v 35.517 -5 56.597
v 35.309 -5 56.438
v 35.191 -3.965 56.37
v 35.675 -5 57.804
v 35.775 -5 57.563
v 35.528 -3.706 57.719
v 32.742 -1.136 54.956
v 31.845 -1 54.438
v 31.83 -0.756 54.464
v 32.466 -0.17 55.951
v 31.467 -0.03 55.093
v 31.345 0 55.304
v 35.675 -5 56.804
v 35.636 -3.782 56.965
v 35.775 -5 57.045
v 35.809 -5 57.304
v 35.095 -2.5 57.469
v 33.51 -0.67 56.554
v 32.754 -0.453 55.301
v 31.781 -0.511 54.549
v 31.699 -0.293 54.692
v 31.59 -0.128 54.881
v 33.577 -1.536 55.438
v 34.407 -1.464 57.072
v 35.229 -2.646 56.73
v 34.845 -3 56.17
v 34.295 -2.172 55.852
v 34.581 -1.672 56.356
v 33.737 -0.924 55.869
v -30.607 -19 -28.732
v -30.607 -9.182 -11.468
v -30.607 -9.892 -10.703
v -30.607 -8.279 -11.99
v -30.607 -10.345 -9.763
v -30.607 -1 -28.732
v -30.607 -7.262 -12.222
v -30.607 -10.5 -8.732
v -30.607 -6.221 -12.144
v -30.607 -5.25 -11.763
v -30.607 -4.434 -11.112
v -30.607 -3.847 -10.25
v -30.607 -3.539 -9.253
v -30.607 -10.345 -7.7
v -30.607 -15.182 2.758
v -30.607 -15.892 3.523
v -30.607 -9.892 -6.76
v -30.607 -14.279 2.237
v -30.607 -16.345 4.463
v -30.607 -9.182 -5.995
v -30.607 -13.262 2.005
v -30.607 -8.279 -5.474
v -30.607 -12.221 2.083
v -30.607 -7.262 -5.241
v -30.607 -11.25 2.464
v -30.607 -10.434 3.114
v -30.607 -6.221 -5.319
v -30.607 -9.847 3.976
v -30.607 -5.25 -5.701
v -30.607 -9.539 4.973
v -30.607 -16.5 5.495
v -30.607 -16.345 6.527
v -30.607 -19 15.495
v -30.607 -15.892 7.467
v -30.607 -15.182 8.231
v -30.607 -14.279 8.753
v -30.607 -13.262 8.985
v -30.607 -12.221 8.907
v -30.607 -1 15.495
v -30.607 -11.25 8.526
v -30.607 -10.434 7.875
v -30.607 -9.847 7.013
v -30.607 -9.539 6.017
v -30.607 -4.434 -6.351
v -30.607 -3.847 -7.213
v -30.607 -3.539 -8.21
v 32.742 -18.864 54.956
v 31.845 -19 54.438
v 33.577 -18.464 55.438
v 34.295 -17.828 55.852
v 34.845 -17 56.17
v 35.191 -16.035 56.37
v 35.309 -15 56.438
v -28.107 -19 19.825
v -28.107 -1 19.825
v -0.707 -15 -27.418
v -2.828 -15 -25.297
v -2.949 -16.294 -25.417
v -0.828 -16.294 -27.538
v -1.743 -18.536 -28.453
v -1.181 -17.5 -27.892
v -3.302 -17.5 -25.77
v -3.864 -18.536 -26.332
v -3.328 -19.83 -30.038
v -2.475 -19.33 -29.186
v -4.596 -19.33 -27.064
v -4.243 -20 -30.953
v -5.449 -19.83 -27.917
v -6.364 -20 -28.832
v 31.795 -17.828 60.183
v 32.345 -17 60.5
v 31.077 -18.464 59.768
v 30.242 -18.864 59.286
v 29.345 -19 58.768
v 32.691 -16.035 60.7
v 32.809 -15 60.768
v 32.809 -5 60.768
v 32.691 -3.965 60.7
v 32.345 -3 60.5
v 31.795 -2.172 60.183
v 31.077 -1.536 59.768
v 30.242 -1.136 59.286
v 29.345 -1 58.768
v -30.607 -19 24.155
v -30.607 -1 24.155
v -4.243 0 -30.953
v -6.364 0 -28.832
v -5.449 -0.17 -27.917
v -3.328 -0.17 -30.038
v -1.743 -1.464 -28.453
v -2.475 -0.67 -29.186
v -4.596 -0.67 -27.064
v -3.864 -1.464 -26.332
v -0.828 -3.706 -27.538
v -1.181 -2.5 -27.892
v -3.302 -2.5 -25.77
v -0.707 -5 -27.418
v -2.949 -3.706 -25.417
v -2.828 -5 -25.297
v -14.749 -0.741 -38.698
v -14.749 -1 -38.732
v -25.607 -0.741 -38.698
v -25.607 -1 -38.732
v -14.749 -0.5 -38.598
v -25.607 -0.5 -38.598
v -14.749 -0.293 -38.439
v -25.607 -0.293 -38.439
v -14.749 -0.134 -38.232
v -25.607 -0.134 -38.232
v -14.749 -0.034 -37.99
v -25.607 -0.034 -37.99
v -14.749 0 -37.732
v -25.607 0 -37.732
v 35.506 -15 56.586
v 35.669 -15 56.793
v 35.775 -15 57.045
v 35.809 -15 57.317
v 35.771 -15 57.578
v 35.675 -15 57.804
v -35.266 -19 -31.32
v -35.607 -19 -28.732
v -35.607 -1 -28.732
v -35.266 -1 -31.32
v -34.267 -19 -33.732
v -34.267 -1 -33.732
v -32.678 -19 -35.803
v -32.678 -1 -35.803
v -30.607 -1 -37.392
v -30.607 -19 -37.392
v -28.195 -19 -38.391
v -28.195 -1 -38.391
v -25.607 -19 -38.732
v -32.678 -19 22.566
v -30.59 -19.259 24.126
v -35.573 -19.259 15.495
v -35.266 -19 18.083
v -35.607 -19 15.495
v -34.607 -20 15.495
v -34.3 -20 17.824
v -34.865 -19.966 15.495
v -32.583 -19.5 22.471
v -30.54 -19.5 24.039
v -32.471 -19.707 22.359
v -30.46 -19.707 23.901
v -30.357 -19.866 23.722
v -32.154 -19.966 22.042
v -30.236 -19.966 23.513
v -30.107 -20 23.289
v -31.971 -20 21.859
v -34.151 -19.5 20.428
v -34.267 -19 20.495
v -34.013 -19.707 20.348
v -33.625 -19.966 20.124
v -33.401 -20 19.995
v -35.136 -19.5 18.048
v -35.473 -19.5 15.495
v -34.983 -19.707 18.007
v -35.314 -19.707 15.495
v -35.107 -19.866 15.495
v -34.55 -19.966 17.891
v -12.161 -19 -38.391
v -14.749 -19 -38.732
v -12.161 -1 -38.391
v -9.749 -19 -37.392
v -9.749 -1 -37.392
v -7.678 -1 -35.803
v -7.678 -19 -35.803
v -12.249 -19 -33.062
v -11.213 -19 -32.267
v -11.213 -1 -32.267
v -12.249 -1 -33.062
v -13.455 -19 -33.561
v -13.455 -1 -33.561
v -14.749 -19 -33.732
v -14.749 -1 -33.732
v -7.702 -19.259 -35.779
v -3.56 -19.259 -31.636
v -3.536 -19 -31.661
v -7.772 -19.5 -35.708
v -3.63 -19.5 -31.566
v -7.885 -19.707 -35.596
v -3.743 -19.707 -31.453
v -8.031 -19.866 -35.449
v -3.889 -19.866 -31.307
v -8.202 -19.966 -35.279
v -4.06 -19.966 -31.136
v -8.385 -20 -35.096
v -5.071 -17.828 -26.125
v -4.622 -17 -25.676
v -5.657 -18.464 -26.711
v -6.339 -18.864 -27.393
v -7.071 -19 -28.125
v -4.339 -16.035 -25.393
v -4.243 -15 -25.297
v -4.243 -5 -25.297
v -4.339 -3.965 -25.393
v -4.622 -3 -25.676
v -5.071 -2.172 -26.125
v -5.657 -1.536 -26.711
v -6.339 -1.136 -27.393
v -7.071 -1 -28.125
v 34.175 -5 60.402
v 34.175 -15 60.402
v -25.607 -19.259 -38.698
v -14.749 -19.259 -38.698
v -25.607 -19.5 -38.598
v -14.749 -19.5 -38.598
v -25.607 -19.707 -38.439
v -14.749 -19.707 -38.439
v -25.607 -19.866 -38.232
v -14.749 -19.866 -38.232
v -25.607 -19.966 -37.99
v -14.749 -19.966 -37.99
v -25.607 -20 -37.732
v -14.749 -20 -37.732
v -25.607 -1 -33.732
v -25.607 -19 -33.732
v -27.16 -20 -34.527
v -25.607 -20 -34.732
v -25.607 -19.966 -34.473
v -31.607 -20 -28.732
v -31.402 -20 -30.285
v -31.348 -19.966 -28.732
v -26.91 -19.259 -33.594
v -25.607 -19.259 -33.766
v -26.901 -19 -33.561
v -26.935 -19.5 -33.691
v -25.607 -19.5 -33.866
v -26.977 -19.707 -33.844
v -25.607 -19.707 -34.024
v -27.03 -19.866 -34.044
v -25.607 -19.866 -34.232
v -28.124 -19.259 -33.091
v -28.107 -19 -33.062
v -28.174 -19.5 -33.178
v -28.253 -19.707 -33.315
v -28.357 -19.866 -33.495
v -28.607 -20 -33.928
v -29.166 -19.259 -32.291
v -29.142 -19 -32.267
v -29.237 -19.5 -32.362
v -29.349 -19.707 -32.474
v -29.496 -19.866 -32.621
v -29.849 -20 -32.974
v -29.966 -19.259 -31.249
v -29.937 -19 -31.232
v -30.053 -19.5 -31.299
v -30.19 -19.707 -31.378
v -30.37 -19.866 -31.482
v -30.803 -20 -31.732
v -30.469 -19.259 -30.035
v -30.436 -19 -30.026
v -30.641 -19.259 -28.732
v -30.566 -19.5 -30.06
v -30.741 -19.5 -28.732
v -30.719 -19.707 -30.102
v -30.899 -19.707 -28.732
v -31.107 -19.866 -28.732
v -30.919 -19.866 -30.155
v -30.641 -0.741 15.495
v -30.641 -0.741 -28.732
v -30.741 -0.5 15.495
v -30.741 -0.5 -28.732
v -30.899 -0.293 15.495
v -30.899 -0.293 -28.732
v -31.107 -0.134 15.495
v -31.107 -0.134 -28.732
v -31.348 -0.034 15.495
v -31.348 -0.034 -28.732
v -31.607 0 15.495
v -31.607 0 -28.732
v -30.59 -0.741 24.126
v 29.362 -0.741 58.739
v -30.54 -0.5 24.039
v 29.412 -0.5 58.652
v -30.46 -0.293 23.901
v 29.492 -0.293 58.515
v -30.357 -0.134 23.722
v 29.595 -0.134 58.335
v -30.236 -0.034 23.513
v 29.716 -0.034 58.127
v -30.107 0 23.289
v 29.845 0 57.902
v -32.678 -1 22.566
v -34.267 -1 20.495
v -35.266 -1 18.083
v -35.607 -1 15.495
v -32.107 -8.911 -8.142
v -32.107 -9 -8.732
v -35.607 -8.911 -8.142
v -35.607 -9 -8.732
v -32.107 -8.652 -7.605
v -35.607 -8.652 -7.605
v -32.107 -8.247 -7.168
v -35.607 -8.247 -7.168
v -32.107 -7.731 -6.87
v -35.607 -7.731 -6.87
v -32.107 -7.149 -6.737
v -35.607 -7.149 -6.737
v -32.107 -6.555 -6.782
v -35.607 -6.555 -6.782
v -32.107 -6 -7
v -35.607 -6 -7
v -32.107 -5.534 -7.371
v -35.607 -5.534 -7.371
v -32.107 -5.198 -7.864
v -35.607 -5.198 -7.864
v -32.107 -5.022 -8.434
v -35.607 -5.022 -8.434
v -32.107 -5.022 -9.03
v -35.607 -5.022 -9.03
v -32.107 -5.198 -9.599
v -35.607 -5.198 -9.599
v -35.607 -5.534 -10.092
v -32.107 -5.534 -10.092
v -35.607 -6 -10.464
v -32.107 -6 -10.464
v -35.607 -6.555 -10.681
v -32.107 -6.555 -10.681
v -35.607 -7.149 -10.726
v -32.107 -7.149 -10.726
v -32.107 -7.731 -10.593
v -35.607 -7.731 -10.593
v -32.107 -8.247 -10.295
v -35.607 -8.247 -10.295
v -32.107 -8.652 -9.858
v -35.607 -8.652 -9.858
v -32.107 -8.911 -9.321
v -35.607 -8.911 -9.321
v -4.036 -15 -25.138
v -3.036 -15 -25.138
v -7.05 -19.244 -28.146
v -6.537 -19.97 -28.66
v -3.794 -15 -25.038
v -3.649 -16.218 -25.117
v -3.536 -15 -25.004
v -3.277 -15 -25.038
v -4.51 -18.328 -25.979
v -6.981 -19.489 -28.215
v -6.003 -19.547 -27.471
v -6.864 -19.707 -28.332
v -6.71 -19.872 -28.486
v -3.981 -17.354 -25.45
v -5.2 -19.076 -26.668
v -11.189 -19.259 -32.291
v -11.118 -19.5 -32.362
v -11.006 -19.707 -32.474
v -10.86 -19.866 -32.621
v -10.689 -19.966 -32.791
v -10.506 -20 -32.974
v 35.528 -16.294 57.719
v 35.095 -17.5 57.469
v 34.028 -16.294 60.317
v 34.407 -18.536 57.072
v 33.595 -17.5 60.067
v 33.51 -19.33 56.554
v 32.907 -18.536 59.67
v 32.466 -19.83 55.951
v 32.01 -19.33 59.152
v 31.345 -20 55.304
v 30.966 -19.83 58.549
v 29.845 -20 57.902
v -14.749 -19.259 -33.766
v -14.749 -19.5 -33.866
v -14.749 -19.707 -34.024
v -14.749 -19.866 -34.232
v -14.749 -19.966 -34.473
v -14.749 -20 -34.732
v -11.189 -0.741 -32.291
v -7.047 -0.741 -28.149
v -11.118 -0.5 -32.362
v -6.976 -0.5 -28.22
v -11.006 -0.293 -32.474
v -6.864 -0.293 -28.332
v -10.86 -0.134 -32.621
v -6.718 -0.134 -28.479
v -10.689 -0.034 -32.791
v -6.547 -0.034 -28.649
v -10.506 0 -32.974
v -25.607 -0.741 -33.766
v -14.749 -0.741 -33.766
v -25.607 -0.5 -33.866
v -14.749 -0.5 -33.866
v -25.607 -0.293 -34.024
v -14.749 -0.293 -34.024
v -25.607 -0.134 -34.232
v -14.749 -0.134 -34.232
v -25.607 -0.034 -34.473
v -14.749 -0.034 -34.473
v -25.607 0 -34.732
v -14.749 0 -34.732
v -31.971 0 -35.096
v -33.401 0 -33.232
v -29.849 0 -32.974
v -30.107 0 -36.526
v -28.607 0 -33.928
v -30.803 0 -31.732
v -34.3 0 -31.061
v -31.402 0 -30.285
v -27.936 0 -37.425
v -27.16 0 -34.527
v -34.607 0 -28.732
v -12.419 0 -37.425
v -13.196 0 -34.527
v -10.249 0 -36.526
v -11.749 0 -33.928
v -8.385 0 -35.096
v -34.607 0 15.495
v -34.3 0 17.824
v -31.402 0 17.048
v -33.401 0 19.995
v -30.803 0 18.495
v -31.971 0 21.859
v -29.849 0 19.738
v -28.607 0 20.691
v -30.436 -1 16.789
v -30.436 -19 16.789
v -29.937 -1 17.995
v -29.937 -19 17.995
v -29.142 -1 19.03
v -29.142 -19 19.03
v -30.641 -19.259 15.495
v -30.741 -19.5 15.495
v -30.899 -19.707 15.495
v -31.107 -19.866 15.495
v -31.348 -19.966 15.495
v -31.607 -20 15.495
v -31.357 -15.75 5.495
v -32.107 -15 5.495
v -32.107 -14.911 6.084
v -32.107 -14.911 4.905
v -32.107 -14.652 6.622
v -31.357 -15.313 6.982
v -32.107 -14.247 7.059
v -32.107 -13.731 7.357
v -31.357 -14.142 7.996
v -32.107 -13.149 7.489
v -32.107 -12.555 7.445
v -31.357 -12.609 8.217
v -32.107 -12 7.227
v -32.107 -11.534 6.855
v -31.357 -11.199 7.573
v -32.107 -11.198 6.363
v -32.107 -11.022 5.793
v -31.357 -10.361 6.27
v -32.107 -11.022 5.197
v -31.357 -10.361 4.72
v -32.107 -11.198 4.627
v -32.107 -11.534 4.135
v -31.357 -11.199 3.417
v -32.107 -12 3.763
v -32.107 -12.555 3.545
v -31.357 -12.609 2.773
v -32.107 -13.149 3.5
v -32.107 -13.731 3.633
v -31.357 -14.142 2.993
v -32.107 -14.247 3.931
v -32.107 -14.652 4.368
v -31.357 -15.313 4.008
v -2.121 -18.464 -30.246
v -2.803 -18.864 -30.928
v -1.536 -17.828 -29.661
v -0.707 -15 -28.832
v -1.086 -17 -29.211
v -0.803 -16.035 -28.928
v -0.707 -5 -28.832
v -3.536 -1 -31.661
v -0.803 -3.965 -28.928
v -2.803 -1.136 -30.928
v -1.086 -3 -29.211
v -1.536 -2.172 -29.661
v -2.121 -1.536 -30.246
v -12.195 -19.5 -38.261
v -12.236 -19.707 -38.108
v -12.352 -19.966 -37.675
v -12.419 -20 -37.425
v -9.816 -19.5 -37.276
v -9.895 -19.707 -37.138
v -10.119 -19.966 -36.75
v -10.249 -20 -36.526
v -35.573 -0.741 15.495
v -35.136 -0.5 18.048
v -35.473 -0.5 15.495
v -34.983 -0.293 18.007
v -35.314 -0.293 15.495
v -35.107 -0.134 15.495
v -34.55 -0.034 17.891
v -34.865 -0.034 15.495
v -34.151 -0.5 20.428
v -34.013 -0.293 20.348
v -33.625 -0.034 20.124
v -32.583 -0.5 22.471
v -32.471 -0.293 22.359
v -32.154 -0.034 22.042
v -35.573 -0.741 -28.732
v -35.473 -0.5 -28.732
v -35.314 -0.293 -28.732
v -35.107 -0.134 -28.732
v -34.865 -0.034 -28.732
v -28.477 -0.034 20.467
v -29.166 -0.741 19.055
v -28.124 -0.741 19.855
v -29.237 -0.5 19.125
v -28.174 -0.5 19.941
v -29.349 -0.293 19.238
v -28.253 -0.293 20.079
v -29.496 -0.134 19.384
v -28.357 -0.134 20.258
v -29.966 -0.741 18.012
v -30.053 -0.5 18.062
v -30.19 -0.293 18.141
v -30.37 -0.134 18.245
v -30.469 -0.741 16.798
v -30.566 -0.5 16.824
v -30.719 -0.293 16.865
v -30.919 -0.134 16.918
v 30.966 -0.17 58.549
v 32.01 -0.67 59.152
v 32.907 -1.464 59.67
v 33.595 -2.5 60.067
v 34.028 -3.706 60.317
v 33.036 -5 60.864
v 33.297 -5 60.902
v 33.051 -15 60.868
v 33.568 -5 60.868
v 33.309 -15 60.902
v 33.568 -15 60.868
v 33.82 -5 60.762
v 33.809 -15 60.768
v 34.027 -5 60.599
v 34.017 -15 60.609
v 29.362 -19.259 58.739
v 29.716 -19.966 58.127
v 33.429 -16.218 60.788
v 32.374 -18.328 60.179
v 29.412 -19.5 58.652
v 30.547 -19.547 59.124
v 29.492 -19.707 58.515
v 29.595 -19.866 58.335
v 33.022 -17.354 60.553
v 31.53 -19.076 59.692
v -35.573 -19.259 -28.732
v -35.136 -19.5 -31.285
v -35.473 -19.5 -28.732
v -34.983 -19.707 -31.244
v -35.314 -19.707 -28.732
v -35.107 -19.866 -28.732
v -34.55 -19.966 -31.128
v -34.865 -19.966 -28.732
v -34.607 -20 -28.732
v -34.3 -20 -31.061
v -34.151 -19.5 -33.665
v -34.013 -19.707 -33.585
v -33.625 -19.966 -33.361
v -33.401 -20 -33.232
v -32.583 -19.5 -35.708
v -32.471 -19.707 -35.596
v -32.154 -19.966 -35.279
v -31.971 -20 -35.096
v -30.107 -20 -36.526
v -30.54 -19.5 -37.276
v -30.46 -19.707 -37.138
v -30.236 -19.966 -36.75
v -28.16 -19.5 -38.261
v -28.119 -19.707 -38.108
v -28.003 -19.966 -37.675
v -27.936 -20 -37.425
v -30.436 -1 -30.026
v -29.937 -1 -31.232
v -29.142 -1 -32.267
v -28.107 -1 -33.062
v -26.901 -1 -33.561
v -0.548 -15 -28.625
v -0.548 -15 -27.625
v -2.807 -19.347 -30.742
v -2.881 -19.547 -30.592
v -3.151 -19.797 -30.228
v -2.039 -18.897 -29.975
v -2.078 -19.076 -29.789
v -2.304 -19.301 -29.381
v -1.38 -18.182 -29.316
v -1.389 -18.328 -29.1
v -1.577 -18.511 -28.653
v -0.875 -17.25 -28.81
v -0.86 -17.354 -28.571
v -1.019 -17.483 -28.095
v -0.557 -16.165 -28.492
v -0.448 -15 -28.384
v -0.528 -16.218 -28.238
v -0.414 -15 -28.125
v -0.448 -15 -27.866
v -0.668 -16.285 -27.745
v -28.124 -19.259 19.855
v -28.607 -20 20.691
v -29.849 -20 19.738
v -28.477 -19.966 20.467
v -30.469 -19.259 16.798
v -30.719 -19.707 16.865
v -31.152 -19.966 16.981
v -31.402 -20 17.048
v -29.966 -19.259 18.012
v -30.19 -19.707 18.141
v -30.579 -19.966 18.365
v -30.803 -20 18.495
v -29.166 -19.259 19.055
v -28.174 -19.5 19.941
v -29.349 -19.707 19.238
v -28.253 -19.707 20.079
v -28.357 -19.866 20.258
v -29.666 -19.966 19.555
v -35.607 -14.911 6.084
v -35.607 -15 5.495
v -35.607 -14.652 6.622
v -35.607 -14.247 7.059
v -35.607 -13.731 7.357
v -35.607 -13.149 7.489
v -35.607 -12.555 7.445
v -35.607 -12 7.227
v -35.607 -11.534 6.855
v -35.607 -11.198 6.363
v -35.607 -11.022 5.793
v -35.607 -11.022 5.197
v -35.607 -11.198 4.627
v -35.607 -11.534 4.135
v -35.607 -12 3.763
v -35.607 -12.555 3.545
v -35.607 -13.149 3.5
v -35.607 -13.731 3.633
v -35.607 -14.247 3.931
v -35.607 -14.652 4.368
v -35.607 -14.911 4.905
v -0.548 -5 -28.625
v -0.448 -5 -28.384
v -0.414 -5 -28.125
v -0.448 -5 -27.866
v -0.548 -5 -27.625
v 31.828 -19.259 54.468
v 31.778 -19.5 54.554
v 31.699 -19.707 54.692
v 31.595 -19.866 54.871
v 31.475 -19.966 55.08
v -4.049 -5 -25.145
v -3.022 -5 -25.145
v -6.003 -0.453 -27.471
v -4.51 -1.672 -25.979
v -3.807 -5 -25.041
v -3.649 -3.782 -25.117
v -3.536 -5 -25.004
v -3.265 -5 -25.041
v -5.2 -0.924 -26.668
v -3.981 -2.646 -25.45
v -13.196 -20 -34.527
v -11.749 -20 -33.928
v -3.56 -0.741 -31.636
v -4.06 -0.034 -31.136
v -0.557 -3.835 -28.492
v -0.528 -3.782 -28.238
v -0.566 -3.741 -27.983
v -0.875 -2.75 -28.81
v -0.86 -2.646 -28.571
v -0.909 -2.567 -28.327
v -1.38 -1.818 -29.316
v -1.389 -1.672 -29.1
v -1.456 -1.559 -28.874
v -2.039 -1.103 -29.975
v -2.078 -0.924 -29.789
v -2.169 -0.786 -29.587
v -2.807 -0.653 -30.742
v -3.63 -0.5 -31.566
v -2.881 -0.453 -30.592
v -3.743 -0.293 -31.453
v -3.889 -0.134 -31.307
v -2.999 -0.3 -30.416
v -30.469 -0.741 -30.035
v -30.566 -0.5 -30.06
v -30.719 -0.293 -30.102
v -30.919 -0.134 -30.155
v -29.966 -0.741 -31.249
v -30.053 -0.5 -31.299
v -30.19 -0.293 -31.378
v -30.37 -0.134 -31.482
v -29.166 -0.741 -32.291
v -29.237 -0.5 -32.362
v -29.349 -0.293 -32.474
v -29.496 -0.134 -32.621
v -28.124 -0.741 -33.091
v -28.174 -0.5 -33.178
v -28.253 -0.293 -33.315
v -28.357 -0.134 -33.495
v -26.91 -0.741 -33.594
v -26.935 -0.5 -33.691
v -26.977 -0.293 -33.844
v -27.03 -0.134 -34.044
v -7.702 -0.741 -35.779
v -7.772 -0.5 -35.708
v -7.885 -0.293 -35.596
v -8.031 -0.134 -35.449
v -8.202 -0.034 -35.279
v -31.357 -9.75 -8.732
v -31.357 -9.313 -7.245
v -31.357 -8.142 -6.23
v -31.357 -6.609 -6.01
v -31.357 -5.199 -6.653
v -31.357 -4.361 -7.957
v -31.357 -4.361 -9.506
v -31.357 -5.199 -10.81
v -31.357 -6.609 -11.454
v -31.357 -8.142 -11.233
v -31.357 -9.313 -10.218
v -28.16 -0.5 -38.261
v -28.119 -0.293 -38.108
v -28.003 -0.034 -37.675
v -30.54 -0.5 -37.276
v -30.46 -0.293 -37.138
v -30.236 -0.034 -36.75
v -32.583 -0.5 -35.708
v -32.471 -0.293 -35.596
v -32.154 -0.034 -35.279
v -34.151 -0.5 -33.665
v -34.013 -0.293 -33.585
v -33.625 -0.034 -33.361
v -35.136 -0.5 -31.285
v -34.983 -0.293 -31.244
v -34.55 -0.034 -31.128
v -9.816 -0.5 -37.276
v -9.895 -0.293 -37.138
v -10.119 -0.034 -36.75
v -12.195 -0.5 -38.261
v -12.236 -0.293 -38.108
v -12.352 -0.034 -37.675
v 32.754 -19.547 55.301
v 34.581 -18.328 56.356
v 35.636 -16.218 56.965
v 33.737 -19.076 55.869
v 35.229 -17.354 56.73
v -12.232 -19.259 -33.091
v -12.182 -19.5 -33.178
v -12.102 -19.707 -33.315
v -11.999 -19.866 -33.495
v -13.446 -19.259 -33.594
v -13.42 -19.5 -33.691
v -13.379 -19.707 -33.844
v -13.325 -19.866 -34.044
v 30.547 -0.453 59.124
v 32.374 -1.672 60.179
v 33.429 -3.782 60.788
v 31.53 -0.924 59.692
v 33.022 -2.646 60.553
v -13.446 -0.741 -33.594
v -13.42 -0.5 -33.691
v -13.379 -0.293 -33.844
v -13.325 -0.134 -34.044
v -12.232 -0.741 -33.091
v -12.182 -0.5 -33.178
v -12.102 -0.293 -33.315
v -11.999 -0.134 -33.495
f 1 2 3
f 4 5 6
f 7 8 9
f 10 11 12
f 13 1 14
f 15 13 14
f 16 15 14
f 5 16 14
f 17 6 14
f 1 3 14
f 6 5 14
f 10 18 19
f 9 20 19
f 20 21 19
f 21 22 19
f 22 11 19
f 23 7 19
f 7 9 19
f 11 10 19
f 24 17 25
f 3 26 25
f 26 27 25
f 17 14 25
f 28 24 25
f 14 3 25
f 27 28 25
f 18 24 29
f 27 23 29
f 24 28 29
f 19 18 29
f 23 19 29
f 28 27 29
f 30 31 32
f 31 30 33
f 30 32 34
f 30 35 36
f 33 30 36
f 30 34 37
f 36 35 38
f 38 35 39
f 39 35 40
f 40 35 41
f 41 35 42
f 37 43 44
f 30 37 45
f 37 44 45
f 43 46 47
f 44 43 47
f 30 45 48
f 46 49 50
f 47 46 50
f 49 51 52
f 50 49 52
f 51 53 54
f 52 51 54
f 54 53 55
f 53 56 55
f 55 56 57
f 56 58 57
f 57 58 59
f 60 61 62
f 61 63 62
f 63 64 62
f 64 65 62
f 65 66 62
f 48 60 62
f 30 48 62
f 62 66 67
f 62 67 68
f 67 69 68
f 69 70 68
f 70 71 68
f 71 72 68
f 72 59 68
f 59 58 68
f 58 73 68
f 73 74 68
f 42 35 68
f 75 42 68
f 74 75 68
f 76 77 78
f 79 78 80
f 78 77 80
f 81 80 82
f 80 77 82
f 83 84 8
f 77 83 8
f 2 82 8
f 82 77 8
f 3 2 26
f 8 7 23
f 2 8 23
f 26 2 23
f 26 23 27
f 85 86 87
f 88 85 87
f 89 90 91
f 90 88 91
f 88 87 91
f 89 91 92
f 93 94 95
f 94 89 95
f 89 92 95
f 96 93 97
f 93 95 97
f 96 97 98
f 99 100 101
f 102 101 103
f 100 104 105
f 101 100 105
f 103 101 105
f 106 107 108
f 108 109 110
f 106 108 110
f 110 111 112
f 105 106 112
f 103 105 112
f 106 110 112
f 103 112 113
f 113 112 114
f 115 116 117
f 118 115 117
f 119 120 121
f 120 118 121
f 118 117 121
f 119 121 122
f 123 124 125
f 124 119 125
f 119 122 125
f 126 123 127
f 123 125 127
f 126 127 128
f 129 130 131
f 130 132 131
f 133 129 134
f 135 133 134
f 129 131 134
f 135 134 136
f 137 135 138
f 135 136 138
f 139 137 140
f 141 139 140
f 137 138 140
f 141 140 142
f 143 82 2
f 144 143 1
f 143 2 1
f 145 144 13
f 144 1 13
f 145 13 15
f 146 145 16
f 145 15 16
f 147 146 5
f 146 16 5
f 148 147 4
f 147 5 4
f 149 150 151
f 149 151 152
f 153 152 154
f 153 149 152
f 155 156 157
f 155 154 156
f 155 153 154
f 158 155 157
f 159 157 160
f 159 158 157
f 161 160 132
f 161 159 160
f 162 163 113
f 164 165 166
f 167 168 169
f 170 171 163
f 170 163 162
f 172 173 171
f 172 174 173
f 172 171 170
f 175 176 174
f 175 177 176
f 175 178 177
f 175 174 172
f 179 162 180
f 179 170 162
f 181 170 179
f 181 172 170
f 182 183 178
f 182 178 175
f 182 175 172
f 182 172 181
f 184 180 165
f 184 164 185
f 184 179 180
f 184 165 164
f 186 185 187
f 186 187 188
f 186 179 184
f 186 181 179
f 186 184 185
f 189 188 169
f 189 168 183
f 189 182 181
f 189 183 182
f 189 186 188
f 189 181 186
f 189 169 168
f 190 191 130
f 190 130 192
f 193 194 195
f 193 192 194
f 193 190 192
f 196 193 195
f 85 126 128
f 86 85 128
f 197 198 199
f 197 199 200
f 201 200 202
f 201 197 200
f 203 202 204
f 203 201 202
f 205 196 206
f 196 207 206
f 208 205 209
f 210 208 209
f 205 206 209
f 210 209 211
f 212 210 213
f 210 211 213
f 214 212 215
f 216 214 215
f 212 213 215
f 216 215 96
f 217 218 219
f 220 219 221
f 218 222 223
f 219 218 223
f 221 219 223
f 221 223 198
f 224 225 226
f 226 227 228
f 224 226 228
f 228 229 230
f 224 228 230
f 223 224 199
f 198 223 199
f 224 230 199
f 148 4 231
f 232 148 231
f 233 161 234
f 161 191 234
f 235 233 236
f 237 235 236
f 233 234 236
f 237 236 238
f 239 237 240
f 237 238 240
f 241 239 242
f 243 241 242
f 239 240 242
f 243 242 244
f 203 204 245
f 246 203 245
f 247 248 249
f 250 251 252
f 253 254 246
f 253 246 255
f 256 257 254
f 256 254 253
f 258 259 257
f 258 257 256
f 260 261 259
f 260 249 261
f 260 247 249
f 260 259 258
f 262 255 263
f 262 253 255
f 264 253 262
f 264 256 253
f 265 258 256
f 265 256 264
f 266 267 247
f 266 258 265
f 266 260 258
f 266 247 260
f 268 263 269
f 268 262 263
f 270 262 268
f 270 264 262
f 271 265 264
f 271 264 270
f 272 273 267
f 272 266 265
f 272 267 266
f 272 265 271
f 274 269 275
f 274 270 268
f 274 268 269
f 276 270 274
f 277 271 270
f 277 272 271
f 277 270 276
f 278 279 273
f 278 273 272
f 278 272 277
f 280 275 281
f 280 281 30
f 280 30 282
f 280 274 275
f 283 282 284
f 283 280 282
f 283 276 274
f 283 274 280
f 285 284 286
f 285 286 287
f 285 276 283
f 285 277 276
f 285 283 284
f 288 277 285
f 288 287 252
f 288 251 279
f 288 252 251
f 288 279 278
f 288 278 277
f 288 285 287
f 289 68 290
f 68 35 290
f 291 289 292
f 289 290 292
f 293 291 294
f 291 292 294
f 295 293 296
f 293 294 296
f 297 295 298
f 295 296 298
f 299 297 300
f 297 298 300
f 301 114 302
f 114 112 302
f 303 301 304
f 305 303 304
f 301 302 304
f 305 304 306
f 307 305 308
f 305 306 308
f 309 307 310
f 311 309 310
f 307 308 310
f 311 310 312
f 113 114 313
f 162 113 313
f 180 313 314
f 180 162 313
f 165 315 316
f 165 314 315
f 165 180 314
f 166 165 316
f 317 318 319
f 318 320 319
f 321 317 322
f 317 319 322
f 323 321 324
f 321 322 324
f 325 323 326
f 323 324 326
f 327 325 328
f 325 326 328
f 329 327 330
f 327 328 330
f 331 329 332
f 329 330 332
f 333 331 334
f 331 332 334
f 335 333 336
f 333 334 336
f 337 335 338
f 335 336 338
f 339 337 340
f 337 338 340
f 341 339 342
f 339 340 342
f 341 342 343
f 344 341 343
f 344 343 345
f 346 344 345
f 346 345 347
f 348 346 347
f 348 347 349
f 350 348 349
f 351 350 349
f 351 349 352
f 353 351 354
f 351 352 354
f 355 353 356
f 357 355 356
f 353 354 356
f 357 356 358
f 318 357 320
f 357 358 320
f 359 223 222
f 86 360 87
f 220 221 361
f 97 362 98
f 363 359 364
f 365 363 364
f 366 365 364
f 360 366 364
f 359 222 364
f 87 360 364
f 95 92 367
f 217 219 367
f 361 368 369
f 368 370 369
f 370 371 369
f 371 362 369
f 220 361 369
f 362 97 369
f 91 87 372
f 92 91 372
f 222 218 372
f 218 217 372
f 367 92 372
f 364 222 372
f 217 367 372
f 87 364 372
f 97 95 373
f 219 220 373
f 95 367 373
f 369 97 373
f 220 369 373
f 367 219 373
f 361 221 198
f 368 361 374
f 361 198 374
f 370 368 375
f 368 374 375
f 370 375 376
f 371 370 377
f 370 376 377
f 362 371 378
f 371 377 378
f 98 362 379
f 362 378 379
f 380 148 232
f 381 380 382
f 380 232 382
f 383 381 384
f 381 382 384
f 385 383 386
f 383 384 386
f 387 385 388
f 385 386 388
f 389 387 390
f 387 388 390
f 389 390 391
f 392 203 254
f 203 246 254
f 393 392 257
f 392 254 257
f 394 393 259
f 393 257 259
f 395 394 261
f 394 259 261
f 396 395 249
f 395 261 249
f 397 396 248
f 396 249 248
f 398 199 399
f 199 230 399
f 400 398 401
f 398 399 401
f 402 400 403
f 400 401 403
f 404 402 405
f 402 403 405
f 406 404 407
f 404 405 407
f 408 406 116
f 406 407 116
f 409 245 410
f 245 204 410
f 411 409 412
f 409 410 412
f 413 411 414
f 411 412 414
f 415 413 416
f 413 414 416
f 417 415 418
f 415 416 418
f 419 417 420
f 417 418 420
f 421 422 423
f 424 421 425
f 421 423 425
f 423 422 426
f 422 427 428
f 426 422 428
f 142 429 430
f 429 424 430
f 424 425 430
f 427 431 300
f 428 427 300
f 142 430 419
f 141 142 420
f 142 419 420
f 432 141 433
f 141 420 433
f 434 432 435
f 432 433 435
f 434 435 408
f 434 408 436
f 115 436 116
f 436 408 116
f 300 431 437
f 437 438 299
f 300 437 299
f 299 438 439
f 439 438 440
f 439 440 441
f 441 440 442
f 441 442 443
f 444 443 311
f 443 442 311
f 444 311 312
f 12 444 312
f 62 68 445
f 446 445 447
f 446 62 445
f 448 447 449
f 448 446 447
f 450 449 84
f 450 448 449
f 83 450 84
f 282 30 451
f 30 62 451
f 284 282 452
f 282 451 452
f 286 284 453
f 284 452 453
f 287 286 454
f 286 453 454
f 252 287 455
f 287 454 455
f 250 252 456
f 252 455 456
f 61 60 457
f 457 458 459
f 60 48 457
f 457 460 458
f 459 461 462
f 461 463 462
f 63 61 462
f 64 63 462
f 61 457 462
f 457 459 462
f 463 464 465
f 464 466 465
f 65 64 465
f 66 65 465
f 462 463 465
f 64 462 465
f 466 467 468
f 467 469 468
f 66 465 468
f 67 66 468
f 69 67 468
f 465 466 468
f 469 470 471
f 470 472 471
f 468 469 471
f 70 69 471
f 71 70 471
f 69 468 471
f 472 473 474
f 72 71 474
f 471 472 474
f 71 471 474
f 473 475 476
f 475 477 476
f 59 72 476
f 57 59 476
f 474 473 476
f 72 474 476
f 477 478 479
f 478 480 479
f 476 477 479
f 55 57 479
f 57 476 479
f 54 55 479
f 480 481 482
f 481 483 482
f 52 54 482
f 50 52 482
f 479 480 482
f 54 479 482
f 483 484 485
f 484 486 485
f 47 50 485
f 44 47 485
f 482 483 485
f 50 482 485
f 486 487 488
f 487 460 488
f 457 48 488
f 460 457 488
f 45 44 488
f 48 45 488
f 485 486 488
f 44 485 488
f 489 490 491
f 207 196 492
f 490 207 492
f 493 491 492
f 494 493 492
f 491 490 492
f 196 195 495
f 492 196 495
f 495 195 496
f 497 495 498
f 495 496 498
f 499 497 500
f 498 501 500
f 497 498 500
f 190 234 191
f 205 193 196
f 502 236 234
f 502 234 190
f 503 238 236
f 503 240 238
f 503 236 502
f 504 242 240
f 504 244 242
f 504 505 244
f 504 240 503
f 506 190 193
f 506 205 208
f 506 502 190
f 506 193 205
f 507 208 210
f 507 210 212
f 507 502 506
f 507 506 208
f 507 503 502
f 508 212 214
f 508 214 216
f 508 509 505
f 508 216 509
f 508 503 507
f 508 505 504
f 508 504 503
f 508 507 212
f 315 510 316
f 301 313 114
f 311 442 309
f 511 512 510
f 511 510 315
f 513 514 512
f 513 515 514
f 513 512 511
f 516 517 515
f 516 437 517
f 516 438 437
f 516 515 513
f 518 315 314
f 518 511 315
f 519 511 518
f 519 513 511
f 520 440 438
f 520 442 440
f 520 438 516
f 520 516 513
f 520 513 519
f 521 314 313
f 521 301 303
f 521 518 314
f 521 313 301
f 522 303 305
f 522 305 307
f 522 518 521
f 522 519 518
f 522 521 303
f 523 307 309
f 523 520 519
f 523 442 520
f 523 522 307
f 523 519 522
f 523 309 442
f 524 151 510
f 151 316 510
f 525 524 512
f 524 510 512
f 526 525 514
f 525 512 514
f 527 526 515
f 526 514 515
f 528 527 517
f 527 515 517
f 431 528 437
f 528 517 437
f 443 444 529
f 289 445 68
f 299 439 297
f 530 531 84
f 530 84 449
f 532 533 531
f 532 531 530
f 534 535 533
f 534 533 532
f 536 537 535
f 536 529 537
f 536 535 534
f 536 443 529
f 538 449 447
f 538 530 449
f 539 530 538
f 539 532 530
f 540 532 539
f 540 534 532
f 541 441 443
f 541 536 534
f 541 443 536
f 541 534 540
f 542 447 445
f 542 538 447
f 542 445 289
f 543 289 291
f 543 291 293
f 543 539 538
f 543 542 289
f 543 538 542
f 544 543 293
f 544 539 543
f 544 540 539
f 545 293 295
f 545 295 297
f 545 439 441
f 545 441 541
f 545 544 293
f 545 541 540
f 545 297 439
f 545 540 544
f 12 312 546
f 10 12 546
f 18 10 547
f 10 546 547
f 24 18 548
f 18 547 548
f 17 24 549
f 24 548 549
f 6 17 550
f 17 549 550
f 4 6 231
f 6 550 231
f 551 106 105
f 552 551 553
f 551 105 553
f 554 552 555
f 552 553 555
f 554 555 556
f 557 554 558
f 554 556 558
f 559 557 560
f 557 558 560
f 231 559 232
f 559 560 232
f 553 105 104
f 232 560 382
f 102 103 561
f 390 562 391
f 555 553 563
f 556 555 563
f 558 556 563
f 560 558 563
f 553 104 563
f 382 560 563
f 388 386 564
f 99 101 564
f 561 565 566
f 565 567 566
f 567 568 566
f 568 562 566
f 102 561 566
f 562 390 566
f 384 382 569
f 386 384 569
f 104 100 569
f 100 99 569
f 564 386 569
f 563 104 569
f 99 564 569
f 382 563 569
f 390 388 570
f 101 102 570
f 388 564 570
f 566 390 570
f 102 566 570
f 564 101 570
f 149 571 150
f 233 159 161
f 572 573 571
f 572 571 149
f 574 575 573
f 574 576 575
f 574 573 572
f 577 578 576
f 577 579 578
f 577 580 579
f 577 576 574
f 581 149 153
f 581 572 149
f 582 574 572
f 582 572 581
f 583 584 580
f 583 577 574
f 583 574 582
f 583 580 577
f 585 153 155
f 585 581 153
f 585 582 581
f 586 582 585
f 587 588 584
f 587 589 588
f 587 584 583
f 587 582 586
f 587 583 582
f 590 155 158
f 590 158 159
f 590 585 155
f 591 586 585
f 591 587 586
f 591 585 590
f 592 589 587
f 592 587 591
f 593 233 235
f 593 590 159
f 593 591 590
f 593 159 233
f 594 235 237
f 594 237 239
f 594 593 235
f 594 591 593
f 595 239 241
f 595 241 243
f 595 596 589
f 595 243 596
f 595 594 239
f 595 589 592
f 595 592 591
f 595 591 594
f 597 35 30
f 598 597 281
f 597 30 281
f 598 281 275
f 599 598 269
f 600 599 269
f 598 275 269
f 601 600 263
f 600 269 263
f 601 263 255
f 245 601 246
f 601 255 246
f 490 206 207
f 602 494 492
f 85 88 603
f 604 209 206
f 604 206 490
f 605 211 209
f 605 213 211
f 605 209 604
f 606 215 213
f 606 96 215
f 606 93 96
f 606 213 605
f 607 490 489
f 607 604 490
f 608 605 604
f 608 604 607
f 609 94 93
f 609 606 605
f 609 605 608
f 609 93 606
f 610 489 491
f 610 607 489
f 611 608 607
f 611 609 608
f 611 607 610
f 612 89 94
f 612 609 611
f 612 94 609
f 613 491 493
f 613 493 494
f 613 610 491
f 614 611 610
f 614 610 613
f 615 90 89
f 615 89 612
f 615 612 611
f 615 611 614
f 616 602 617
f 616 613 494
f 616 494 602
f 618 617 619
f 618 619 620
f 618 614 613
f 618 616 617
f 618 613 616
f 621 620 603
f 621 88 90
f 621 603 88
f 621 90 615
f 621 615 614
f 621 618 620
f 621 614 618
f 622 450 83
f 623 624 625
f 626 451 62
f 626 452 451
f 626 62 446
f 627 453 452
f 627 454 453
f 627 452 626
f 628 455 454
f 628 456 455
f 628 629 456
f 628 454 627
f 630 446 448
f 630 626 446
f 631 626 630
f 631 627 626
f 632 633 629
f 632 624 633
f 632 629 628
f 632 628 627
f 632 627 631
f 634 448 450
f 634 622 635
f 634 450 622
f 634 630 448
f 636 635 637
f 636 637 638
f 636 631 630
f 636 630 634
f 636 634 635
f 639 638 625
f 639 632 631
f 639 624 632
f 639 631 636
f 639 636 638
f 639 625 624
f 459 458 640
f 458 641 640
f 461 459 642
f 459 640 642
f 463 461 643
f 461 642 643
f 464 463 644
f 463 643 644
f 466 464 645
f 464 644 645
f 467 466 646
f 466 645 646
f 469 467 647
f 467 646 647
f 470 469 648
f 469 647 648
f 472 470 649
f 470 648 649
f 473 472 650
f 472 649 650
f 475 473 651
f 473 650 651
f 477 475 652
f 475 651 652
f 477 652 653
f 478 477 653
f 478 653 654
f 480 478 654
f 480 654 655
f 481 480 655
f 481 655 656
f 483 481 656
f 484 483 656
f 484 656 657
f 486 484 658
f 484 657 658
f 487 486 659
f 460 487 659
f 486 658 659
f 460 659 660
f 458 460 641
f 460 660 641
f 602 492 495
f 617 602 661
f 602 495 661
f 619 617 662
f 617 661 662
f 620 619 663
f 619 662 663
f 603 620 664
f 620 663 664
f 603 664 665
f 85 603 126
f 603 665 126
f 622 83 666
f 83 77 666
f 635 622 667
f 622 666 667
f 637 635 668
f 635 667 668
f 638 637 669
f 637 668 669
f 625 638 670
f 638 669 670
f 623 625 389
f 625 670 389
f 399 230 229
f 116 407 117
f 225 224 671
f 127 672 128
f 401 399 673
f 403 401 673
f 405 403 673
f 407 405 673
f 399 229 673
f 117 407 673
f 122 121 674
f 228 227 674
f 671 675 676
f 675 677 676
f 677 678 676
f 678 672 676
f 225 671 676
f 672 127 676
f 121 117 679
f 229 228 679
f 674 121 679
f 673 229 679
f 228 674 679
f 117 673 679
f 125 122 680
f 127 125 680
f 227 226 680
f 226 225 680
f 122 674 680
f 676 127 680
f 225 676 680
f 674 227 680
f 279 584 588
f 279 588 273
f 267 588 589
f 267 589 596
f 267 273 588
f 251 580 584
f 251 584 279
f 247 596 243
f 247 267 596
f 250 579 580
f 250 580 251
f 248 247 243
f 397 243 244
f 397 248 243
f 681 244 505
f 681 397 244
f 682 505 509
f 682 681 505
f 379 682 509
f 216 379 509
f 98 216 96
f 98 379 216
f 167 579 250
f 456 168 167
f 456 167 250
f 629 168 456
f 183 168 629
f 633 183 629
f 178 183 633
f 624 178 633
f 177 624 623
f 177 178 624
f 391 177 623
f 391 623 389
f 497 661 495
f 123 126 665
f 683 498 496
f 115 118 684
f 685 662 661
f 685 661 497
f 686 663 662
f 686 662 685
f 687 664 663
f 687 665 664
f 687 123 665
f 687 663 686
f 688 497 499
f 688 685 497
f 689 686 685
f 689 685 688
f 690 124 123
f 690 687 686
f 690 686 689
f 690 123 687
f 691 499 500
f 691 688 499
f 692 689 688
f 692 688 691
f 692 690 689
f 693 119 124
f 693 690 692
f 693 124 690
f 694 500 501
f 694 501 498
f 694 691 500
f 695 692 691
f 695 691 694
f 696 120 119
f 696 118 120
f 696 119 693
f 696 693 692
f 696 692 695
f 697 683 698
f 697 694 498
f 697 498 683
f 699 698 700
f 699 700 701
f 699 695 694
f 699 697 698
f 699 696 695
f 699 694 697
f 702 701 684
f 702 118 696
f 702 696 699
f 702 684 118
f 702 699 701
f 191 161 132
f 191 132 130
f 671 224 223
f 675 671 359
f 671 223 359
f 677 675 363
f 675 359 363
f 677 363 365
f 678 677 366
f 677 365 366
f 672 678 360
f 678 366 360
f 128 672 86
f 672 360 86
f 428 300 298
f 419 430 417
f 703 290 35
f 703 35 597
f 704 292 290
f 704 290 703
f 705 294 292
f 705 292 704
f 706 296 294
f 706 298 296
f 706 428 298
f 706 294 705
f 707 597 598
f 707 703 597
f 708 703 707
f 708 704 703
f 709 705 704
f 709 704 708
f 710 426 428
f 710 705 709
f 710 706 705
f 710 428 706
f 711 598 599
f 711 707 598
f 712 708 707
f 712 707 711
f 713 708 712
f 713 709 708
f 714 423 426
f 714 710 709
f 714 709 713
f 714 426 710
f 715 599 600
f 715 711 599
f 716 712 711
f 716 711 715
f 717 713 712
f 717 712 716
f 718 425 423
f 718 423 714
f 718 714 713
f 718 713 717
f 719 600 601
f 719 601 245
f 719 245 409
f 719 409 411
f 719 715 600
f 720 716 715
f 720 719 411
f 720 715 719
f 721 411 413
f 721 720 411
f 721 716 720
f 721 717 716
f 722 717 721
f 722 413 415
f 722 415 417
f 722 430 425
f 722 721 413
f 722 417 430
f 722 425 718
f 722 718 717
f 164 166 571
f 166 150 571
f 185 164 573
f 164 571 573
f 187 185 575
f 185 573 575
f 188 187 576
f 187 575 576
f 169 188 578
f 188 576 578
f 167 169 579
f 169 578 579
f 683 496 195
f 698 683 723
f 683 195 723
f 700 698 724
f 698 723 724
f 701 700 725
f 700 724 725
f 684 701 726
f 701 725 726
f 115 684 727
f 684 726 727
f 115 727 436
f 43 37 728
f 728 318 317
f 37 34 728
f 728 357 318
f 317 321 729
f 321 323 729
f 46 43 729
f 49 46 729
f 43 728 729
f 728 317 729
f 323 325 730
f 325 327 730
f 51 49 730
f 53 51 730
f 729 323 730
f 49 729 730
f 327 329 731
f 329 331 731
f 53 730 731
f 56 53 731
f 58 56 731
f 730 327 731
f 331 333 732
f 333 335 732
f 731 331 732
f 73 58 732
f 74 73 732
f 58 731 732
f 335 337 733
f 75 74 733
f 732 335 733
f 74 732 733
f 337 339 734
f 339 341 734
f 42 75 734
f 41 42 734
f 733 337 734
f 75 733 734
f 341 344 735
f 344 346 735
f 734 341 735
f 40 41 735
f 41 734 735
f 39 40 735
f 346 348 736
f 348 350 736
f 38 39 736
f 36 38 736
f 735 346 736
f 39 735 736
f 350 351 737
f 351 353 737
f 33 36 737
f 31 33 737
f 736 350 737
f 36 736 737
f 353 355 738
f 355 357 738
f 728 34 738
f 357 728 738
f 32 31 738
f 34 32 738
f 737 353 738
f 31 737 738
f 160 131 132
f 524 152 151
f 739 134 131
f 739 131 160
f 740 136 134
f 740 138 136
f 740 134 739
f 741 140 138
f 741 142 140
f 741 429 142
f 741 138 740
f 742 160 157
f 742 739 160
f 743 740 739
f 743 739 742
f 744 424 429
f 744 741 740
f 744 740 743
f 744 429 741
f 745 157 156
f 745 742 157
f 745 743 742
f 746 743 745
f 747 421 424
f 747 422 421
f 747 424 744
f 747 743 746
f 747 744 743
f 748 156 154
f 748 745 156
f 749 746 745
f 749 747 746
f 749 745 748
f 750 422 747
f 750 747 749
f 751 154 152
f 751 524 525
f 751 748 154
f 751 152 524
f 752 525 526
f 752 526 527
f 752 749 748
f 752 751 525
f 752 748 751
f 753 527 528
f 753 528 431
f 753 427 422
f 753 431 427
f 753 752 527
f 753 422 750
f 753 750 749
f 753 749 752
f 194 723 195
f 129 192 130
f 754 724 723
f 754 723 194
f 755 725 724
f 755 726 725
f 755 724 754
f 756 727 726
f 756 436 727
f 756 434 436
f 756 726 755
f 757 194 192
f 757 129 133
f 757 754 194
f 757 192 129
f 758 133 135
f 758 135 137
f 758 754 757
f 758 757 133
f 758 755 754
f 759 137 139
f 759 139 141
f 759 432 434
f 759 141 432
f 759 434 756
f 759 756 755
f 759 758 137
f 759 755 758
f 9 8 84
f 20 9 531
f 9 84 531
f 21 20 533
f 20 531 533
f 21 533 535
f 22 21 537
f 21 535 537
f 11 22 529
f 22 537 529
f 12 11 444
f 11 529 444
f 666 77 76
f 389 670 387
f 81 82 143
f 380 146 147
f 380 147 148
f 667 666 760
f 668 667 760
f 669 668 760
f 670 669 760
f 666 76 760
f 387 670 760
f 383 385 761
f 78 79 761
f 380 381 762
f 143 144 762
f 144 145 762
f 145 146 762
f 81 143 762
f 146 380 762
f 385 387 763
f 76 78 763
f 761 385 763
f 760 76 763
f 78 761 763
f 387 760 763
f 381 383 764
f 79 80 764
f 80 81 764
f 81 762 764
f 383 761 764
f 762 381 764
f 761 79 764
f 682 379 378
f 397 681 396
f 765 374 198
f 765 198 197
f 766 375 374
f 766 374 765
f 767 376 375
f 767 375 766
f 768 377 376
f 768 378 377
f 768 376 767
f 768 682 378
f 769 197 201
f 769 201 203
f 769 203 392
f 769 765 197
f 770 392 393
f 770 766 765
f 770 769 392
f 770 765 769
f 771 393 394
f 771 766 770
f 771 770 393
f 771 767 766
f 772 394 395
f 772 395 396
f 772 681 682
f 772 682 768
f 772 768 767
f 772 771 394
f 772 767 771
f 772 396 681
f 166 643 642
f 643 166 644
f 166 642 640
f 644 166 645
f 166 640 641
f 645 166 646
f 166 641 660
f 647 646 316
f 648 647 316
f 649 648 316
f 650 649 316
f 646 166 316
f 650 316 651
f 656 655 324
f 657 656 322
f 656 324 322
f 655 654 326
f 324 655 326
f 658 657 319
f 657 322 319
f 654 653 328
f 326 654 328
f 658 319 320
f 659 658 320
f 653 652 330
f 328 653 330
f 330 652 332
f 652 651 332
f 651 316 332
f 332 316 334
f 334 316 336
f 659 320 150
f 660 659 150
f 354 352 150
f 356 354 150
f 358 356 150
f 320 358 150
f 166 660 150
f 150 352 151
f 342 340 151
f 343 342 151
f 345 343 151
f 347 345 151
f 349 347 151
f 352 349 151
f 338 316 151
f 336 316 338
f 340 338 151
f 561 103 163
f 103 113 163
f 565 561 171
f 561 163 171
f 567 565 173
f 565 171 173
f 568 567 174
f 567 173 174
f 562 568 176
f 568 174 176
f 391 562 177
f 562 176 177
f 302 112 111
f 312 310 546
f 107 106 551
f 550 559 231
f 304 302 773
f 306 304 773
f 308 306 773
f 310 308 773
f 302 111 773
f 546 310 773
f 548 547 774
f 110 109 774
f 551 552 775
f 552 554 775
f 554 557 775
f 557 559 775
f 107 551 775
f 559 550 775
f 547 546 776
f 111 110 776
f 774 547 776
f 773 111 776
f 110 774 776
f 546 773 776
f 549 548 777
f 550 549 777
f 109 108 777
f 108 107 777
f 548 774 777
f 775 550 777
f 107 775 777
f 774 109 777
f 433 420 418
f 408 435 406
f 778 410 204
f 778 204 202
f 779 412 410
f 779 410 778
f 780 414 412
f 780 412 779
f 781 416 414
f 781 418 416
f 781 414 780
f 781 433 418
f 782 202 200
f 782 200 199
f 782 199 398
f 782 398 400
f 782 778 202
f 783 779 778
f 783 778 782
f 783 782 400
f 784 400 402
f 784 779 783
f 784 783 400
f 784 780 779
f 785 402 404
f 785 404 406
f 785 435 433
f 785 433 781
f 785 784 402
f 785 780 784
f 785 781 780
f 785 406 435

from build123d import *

# Parameters (mm, degrees)
F1_DEPTH        = 20
F2_R            = 10
F3_R            = 10
F4_R            = 5
F5_R            = 5
F6_R            = 5
F7_R            = 5
F8_R            = 1
F10_D           = 4
F10_CSINK_D     = 7
F10_CSINK_ANGLE = 90


with BuildPart() as f1:
    # F0 (on Front) → F1 (new body)
    with BuildSketch(Plane.XZ):
        Polygon((33.675430585, 61.2683971646), (-35.6066017178, 21.2683971646), (-35.6066017178, -33.7316028354), (-35.6066017178, -38.7316028354), (-30.6066017178, -38.7316028354), (-10.6066017178, -38.7316028354), (0, -28.1250011176), (-3.5355339059, -24.5894672117), (-12.6776695297, -33.7316028354), (-30.6066017178, -33.7316028354), (-30.6066017178, 18.3816458187), (36.175430585, 56.9382701457), align=None)
    extrude(amount=F1_DEPTH)

    # F2
    f2_edges = [f1.edges().sort_by_distance(p)[0] for p in [
        (-35.606602, -10, 21.268397),
    ]]
    fillet(f2_edges, radius=F2_R)

    # F3
    f3_edges = [f1.edges().sort_by_distance(p)[0] for p in [
        (-35.606602, -10, -38.731603),
        (-10.606602, -10, -38.731603),
    ]]
    fillet(f3_edges, radius=F3_R)

    # F4
    f4_edges = [f1.edges().sort_by_distance(p)[0] for p in [
        (-30.606602, -10, -33.731603),
        (-12.67767, -10, -33.731603),
    ]]
    fillet(f4_edges, radius=F4_R)

    # F5
    f5_edges = [f1.edges().sort_by_distance(p)[0] for p in [
        (-30.606602, -10, 18.381646),
    ]]
    fillet(f5_edges, radius=F5_R)

    # F6
    f6_edges = [f1.edges().sort_by_distance(p)[0] for p in [
        (-1.767767, 0, -26.357234),
        (-1.767767, -20, -26.357234),
    ]]
    fillet(f6_edges, radius=F6_R)

    # F7
    f7_edges = [f1.edges().sort_by_distance(p)[0] for p in [
        (34.925431, 0, 59.103334),
        (34.925431, -20, 59.103334),
    ]]
    fillet(f7_edges, radius=F7_R)

    # F8
    f8_edges = [f1.edges().sort_by_distance(p)[0] for p in [
        (-0.630649, -20, 41.461773),
        (1.869351, -20, 37.131646),
        (32.407166, -18.535534, 60.536164),
        (34.907166, -18.535534, 56.206037),
    ]]
    fillet(f8_edges, radius=F8_R)

    # F10 (through all)
    with Locations(Plane.YZ.offset(-30.6066017178)):
        with Locations((-13, 5.4948944727), (-7, -8.7316028354)):
            CounterSinkHole(F10_D / 2, F10_CSINK_D / 2, counter_sink_angle=F10_CSINK_ANGLE)


solid = f1.part
